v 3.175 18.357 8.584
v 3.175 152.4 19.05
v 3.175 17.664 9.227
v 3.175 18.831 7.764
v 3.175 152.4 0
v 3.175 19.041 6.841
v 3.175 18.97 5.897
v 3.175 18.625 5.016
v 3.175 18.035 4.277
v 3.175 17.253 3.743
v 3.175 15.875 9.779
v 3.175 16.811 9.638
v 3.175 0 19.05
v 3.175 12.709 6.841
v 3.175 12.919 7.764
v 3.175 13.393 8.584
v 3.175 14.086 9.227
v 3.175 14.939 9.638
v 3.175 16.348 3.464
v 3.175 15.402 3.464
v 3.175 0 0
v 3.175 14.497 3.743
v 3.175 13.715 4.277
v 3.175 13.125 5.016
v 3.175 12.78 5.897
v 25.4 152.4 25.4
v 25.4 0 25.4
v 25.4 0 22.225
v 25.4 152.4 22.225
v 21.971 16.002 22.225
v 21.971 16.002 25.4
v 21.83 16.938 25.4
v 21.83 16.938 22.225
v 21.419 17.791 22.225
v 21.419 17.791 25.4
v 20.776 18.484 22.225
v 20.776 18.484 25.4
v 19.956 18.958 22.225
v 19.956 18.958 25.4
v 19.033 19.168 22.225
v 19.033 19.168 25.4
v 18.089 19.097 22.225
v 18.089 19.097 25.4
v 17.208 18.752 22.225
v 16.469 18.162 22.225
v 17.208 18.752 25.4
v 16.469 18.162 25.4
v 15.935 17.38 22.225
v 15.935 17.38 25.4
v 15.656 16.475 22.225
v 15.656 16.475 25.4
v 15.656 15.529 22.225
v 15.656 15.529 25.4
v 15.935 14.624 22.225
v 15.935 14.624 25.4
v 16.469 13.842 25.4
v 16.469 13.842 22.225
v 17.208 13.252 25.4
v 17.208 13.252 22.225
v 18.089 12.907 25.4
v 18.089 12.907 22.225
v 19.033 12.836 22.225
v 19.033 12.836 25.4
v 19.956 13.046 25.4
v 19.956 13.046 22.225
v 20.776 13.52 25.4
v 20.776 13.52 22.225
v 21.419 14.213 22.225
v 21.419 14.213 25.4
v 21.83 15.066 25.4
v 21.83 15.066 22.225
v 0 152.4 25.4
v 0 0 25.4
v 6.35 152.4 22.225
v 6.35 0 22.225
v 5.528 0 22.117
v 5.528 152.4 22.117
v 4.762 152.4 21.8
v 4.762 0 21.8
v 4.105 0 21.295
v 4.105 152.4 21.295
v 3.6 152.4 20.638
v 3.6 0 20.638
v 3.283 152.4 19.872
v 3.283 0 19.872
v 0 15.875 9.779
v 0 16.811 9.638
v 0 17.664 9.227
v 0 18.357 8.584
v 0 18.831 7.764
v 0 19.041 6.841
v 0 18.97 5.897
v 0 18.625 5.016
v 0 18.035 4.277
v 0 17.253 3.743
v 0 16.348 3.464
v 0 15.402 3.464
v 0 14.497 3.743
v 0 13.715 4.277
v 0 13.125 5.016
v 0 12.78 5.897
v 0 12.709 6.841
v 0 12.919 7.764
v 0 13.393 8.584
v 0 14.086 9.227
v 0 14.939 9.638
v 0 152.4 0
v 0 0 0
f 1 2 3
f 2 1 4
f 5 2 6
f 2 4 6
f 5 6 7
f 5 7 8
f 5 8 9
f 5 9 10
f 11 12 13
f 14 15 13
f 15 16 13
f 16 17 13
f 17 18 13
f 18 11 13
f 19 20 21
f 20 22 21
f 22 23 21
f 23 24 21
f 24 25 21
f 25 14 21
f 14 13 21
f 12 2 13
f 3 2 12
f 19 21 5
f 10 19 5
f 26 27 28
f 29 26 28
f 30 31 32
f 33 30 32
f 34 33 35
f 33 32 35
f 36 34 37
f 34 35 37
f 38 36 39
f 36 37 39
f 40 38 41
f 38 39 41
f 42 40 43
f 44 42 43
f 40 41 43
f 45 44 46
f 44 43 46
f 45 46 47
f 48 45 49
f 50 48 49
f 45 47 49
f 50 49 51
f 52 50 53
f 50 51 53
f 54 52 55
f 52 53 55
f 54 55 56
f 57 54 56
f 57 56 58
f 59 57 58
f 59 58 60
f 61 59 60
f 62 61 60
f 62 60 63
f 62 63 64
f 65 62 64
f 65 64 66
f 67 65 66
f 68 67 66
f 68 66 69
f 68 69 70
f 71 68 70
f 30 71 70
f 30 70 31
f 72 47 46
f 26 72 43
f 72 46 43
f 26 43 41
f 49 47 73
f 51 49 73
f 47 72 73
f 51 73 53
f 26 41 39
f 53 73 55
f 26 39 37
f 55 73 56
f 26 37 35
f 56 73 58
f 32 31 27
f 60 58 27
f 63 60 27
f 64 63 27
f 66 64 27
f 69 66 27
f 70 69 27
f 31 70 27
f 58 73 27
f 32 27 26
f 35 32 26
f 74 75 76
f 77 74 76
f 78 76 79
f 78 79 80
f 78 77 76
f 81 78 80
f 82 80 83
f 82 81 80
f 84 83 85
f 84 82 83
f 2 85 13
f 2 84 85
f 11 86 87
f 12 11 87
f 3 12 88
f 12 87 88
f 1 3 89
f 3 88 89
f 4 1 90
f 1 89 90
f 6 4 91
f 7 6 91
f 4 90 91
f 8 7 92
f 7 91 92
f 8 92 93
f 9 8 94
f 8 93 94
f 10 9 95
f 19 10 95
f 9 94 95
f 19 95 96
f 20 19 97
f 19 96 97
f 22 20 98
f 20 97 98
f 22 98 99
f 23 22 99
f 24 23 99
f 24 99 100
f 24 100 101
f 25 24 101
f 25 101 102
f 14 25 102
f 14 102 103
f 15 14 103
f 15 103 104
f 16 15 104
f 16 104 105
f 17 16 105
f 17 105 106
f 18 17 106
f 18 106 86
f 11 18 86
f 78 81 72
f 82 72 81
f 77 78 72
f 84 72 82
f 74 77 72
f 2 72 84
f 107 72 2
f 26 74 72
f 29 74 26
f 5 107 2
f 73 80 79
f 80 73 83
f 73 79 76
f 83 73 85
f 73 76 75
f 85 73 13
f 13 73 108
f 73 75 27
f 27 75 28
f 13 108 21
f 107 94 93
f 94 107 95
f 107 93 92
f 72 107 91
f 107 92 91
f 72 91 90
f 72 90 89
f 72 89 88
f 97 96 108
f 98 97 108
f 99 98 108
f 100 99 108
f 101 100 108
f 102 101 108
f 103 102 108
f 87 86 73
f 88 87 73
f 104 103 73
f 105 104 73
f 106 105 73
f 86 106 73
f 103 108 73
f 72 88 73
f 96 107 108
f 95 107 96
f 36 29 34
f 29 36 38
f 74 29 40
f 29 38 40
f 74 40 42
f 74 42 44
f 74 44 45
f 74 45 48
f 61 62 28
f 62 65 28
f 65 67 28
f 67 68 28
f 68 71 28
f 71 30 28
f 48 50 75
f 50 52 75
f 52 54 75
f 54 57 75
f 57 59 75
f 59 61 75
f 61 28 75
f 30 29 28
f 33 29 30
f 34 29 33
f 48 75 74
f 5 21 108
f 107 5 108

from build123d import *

# Parameters (mm, degrees)
BOSS_EXTRUDE1_DEPTH = 152.4
FILLET2_R           = 3.175
SKETCH3_R           = 3.175
CUT_EXTRUDE2_DEPTH  = 157.576115675
CUT_EXTRUDE3_REACH  = 158.576
SKETCH4_R           = 3.175


with BuildPart() as part:
    # Sketch1 → Boss-Extrude1 (new body)
    with BuildSketch(Plane(origin=(0, 0, 0), x_dir=(1, 0, 0), z_dir=(0, 1, 0))):
        Polygon((0, 0), (0, -25.4), (25.4, -25.4), (25.4, -22.225), (3.175, -22.225), (3.175, 0), align=None)
    extrude(amount=BOSS_EXTRUDE1_DEPTH)

    # Fillet2
    fillet2_edges = [part.edges().sort_by_distance(p)[0] for p in [
        (3.175, 76.2, 22.225),
    ]]
    fillet(fillet2_edges, radius=FILLET2_R)

    # Sketch3 → Cut-Extrude2 (cut, through all)
    with BuildSketch(Plane.ZY):
        with Locations((6.604, 15.875)):
            Circle(SKETCH3_R)
    extrude(amount=-CUT_EXTRUDE2_DEPTH, mode=Mode.SUBTRACT)

    # Sketch4 → Cut-Extrude3 (cut, up to next)
    with BuildSketch(Plane.XY.offset(25.4), mode=Mode.PRIVATE) as cut_extrude3_sk1:
        with Locations((18.796, 16.002)):
            Circle(SKETCH4_R)
    cut_extrude3_tool1 = extrude(cut_extrude3_sk1.sketch, amount=-CUT_EXTRUDE3_REACH, mode=Mode.PRIVATE) & part.part
    add(cut_extrude3_tool1.solids().sort_by_distance((18.796, 16.002, 25.4))[0], mode=Mode.SUBTRACT)


solid = part.part
